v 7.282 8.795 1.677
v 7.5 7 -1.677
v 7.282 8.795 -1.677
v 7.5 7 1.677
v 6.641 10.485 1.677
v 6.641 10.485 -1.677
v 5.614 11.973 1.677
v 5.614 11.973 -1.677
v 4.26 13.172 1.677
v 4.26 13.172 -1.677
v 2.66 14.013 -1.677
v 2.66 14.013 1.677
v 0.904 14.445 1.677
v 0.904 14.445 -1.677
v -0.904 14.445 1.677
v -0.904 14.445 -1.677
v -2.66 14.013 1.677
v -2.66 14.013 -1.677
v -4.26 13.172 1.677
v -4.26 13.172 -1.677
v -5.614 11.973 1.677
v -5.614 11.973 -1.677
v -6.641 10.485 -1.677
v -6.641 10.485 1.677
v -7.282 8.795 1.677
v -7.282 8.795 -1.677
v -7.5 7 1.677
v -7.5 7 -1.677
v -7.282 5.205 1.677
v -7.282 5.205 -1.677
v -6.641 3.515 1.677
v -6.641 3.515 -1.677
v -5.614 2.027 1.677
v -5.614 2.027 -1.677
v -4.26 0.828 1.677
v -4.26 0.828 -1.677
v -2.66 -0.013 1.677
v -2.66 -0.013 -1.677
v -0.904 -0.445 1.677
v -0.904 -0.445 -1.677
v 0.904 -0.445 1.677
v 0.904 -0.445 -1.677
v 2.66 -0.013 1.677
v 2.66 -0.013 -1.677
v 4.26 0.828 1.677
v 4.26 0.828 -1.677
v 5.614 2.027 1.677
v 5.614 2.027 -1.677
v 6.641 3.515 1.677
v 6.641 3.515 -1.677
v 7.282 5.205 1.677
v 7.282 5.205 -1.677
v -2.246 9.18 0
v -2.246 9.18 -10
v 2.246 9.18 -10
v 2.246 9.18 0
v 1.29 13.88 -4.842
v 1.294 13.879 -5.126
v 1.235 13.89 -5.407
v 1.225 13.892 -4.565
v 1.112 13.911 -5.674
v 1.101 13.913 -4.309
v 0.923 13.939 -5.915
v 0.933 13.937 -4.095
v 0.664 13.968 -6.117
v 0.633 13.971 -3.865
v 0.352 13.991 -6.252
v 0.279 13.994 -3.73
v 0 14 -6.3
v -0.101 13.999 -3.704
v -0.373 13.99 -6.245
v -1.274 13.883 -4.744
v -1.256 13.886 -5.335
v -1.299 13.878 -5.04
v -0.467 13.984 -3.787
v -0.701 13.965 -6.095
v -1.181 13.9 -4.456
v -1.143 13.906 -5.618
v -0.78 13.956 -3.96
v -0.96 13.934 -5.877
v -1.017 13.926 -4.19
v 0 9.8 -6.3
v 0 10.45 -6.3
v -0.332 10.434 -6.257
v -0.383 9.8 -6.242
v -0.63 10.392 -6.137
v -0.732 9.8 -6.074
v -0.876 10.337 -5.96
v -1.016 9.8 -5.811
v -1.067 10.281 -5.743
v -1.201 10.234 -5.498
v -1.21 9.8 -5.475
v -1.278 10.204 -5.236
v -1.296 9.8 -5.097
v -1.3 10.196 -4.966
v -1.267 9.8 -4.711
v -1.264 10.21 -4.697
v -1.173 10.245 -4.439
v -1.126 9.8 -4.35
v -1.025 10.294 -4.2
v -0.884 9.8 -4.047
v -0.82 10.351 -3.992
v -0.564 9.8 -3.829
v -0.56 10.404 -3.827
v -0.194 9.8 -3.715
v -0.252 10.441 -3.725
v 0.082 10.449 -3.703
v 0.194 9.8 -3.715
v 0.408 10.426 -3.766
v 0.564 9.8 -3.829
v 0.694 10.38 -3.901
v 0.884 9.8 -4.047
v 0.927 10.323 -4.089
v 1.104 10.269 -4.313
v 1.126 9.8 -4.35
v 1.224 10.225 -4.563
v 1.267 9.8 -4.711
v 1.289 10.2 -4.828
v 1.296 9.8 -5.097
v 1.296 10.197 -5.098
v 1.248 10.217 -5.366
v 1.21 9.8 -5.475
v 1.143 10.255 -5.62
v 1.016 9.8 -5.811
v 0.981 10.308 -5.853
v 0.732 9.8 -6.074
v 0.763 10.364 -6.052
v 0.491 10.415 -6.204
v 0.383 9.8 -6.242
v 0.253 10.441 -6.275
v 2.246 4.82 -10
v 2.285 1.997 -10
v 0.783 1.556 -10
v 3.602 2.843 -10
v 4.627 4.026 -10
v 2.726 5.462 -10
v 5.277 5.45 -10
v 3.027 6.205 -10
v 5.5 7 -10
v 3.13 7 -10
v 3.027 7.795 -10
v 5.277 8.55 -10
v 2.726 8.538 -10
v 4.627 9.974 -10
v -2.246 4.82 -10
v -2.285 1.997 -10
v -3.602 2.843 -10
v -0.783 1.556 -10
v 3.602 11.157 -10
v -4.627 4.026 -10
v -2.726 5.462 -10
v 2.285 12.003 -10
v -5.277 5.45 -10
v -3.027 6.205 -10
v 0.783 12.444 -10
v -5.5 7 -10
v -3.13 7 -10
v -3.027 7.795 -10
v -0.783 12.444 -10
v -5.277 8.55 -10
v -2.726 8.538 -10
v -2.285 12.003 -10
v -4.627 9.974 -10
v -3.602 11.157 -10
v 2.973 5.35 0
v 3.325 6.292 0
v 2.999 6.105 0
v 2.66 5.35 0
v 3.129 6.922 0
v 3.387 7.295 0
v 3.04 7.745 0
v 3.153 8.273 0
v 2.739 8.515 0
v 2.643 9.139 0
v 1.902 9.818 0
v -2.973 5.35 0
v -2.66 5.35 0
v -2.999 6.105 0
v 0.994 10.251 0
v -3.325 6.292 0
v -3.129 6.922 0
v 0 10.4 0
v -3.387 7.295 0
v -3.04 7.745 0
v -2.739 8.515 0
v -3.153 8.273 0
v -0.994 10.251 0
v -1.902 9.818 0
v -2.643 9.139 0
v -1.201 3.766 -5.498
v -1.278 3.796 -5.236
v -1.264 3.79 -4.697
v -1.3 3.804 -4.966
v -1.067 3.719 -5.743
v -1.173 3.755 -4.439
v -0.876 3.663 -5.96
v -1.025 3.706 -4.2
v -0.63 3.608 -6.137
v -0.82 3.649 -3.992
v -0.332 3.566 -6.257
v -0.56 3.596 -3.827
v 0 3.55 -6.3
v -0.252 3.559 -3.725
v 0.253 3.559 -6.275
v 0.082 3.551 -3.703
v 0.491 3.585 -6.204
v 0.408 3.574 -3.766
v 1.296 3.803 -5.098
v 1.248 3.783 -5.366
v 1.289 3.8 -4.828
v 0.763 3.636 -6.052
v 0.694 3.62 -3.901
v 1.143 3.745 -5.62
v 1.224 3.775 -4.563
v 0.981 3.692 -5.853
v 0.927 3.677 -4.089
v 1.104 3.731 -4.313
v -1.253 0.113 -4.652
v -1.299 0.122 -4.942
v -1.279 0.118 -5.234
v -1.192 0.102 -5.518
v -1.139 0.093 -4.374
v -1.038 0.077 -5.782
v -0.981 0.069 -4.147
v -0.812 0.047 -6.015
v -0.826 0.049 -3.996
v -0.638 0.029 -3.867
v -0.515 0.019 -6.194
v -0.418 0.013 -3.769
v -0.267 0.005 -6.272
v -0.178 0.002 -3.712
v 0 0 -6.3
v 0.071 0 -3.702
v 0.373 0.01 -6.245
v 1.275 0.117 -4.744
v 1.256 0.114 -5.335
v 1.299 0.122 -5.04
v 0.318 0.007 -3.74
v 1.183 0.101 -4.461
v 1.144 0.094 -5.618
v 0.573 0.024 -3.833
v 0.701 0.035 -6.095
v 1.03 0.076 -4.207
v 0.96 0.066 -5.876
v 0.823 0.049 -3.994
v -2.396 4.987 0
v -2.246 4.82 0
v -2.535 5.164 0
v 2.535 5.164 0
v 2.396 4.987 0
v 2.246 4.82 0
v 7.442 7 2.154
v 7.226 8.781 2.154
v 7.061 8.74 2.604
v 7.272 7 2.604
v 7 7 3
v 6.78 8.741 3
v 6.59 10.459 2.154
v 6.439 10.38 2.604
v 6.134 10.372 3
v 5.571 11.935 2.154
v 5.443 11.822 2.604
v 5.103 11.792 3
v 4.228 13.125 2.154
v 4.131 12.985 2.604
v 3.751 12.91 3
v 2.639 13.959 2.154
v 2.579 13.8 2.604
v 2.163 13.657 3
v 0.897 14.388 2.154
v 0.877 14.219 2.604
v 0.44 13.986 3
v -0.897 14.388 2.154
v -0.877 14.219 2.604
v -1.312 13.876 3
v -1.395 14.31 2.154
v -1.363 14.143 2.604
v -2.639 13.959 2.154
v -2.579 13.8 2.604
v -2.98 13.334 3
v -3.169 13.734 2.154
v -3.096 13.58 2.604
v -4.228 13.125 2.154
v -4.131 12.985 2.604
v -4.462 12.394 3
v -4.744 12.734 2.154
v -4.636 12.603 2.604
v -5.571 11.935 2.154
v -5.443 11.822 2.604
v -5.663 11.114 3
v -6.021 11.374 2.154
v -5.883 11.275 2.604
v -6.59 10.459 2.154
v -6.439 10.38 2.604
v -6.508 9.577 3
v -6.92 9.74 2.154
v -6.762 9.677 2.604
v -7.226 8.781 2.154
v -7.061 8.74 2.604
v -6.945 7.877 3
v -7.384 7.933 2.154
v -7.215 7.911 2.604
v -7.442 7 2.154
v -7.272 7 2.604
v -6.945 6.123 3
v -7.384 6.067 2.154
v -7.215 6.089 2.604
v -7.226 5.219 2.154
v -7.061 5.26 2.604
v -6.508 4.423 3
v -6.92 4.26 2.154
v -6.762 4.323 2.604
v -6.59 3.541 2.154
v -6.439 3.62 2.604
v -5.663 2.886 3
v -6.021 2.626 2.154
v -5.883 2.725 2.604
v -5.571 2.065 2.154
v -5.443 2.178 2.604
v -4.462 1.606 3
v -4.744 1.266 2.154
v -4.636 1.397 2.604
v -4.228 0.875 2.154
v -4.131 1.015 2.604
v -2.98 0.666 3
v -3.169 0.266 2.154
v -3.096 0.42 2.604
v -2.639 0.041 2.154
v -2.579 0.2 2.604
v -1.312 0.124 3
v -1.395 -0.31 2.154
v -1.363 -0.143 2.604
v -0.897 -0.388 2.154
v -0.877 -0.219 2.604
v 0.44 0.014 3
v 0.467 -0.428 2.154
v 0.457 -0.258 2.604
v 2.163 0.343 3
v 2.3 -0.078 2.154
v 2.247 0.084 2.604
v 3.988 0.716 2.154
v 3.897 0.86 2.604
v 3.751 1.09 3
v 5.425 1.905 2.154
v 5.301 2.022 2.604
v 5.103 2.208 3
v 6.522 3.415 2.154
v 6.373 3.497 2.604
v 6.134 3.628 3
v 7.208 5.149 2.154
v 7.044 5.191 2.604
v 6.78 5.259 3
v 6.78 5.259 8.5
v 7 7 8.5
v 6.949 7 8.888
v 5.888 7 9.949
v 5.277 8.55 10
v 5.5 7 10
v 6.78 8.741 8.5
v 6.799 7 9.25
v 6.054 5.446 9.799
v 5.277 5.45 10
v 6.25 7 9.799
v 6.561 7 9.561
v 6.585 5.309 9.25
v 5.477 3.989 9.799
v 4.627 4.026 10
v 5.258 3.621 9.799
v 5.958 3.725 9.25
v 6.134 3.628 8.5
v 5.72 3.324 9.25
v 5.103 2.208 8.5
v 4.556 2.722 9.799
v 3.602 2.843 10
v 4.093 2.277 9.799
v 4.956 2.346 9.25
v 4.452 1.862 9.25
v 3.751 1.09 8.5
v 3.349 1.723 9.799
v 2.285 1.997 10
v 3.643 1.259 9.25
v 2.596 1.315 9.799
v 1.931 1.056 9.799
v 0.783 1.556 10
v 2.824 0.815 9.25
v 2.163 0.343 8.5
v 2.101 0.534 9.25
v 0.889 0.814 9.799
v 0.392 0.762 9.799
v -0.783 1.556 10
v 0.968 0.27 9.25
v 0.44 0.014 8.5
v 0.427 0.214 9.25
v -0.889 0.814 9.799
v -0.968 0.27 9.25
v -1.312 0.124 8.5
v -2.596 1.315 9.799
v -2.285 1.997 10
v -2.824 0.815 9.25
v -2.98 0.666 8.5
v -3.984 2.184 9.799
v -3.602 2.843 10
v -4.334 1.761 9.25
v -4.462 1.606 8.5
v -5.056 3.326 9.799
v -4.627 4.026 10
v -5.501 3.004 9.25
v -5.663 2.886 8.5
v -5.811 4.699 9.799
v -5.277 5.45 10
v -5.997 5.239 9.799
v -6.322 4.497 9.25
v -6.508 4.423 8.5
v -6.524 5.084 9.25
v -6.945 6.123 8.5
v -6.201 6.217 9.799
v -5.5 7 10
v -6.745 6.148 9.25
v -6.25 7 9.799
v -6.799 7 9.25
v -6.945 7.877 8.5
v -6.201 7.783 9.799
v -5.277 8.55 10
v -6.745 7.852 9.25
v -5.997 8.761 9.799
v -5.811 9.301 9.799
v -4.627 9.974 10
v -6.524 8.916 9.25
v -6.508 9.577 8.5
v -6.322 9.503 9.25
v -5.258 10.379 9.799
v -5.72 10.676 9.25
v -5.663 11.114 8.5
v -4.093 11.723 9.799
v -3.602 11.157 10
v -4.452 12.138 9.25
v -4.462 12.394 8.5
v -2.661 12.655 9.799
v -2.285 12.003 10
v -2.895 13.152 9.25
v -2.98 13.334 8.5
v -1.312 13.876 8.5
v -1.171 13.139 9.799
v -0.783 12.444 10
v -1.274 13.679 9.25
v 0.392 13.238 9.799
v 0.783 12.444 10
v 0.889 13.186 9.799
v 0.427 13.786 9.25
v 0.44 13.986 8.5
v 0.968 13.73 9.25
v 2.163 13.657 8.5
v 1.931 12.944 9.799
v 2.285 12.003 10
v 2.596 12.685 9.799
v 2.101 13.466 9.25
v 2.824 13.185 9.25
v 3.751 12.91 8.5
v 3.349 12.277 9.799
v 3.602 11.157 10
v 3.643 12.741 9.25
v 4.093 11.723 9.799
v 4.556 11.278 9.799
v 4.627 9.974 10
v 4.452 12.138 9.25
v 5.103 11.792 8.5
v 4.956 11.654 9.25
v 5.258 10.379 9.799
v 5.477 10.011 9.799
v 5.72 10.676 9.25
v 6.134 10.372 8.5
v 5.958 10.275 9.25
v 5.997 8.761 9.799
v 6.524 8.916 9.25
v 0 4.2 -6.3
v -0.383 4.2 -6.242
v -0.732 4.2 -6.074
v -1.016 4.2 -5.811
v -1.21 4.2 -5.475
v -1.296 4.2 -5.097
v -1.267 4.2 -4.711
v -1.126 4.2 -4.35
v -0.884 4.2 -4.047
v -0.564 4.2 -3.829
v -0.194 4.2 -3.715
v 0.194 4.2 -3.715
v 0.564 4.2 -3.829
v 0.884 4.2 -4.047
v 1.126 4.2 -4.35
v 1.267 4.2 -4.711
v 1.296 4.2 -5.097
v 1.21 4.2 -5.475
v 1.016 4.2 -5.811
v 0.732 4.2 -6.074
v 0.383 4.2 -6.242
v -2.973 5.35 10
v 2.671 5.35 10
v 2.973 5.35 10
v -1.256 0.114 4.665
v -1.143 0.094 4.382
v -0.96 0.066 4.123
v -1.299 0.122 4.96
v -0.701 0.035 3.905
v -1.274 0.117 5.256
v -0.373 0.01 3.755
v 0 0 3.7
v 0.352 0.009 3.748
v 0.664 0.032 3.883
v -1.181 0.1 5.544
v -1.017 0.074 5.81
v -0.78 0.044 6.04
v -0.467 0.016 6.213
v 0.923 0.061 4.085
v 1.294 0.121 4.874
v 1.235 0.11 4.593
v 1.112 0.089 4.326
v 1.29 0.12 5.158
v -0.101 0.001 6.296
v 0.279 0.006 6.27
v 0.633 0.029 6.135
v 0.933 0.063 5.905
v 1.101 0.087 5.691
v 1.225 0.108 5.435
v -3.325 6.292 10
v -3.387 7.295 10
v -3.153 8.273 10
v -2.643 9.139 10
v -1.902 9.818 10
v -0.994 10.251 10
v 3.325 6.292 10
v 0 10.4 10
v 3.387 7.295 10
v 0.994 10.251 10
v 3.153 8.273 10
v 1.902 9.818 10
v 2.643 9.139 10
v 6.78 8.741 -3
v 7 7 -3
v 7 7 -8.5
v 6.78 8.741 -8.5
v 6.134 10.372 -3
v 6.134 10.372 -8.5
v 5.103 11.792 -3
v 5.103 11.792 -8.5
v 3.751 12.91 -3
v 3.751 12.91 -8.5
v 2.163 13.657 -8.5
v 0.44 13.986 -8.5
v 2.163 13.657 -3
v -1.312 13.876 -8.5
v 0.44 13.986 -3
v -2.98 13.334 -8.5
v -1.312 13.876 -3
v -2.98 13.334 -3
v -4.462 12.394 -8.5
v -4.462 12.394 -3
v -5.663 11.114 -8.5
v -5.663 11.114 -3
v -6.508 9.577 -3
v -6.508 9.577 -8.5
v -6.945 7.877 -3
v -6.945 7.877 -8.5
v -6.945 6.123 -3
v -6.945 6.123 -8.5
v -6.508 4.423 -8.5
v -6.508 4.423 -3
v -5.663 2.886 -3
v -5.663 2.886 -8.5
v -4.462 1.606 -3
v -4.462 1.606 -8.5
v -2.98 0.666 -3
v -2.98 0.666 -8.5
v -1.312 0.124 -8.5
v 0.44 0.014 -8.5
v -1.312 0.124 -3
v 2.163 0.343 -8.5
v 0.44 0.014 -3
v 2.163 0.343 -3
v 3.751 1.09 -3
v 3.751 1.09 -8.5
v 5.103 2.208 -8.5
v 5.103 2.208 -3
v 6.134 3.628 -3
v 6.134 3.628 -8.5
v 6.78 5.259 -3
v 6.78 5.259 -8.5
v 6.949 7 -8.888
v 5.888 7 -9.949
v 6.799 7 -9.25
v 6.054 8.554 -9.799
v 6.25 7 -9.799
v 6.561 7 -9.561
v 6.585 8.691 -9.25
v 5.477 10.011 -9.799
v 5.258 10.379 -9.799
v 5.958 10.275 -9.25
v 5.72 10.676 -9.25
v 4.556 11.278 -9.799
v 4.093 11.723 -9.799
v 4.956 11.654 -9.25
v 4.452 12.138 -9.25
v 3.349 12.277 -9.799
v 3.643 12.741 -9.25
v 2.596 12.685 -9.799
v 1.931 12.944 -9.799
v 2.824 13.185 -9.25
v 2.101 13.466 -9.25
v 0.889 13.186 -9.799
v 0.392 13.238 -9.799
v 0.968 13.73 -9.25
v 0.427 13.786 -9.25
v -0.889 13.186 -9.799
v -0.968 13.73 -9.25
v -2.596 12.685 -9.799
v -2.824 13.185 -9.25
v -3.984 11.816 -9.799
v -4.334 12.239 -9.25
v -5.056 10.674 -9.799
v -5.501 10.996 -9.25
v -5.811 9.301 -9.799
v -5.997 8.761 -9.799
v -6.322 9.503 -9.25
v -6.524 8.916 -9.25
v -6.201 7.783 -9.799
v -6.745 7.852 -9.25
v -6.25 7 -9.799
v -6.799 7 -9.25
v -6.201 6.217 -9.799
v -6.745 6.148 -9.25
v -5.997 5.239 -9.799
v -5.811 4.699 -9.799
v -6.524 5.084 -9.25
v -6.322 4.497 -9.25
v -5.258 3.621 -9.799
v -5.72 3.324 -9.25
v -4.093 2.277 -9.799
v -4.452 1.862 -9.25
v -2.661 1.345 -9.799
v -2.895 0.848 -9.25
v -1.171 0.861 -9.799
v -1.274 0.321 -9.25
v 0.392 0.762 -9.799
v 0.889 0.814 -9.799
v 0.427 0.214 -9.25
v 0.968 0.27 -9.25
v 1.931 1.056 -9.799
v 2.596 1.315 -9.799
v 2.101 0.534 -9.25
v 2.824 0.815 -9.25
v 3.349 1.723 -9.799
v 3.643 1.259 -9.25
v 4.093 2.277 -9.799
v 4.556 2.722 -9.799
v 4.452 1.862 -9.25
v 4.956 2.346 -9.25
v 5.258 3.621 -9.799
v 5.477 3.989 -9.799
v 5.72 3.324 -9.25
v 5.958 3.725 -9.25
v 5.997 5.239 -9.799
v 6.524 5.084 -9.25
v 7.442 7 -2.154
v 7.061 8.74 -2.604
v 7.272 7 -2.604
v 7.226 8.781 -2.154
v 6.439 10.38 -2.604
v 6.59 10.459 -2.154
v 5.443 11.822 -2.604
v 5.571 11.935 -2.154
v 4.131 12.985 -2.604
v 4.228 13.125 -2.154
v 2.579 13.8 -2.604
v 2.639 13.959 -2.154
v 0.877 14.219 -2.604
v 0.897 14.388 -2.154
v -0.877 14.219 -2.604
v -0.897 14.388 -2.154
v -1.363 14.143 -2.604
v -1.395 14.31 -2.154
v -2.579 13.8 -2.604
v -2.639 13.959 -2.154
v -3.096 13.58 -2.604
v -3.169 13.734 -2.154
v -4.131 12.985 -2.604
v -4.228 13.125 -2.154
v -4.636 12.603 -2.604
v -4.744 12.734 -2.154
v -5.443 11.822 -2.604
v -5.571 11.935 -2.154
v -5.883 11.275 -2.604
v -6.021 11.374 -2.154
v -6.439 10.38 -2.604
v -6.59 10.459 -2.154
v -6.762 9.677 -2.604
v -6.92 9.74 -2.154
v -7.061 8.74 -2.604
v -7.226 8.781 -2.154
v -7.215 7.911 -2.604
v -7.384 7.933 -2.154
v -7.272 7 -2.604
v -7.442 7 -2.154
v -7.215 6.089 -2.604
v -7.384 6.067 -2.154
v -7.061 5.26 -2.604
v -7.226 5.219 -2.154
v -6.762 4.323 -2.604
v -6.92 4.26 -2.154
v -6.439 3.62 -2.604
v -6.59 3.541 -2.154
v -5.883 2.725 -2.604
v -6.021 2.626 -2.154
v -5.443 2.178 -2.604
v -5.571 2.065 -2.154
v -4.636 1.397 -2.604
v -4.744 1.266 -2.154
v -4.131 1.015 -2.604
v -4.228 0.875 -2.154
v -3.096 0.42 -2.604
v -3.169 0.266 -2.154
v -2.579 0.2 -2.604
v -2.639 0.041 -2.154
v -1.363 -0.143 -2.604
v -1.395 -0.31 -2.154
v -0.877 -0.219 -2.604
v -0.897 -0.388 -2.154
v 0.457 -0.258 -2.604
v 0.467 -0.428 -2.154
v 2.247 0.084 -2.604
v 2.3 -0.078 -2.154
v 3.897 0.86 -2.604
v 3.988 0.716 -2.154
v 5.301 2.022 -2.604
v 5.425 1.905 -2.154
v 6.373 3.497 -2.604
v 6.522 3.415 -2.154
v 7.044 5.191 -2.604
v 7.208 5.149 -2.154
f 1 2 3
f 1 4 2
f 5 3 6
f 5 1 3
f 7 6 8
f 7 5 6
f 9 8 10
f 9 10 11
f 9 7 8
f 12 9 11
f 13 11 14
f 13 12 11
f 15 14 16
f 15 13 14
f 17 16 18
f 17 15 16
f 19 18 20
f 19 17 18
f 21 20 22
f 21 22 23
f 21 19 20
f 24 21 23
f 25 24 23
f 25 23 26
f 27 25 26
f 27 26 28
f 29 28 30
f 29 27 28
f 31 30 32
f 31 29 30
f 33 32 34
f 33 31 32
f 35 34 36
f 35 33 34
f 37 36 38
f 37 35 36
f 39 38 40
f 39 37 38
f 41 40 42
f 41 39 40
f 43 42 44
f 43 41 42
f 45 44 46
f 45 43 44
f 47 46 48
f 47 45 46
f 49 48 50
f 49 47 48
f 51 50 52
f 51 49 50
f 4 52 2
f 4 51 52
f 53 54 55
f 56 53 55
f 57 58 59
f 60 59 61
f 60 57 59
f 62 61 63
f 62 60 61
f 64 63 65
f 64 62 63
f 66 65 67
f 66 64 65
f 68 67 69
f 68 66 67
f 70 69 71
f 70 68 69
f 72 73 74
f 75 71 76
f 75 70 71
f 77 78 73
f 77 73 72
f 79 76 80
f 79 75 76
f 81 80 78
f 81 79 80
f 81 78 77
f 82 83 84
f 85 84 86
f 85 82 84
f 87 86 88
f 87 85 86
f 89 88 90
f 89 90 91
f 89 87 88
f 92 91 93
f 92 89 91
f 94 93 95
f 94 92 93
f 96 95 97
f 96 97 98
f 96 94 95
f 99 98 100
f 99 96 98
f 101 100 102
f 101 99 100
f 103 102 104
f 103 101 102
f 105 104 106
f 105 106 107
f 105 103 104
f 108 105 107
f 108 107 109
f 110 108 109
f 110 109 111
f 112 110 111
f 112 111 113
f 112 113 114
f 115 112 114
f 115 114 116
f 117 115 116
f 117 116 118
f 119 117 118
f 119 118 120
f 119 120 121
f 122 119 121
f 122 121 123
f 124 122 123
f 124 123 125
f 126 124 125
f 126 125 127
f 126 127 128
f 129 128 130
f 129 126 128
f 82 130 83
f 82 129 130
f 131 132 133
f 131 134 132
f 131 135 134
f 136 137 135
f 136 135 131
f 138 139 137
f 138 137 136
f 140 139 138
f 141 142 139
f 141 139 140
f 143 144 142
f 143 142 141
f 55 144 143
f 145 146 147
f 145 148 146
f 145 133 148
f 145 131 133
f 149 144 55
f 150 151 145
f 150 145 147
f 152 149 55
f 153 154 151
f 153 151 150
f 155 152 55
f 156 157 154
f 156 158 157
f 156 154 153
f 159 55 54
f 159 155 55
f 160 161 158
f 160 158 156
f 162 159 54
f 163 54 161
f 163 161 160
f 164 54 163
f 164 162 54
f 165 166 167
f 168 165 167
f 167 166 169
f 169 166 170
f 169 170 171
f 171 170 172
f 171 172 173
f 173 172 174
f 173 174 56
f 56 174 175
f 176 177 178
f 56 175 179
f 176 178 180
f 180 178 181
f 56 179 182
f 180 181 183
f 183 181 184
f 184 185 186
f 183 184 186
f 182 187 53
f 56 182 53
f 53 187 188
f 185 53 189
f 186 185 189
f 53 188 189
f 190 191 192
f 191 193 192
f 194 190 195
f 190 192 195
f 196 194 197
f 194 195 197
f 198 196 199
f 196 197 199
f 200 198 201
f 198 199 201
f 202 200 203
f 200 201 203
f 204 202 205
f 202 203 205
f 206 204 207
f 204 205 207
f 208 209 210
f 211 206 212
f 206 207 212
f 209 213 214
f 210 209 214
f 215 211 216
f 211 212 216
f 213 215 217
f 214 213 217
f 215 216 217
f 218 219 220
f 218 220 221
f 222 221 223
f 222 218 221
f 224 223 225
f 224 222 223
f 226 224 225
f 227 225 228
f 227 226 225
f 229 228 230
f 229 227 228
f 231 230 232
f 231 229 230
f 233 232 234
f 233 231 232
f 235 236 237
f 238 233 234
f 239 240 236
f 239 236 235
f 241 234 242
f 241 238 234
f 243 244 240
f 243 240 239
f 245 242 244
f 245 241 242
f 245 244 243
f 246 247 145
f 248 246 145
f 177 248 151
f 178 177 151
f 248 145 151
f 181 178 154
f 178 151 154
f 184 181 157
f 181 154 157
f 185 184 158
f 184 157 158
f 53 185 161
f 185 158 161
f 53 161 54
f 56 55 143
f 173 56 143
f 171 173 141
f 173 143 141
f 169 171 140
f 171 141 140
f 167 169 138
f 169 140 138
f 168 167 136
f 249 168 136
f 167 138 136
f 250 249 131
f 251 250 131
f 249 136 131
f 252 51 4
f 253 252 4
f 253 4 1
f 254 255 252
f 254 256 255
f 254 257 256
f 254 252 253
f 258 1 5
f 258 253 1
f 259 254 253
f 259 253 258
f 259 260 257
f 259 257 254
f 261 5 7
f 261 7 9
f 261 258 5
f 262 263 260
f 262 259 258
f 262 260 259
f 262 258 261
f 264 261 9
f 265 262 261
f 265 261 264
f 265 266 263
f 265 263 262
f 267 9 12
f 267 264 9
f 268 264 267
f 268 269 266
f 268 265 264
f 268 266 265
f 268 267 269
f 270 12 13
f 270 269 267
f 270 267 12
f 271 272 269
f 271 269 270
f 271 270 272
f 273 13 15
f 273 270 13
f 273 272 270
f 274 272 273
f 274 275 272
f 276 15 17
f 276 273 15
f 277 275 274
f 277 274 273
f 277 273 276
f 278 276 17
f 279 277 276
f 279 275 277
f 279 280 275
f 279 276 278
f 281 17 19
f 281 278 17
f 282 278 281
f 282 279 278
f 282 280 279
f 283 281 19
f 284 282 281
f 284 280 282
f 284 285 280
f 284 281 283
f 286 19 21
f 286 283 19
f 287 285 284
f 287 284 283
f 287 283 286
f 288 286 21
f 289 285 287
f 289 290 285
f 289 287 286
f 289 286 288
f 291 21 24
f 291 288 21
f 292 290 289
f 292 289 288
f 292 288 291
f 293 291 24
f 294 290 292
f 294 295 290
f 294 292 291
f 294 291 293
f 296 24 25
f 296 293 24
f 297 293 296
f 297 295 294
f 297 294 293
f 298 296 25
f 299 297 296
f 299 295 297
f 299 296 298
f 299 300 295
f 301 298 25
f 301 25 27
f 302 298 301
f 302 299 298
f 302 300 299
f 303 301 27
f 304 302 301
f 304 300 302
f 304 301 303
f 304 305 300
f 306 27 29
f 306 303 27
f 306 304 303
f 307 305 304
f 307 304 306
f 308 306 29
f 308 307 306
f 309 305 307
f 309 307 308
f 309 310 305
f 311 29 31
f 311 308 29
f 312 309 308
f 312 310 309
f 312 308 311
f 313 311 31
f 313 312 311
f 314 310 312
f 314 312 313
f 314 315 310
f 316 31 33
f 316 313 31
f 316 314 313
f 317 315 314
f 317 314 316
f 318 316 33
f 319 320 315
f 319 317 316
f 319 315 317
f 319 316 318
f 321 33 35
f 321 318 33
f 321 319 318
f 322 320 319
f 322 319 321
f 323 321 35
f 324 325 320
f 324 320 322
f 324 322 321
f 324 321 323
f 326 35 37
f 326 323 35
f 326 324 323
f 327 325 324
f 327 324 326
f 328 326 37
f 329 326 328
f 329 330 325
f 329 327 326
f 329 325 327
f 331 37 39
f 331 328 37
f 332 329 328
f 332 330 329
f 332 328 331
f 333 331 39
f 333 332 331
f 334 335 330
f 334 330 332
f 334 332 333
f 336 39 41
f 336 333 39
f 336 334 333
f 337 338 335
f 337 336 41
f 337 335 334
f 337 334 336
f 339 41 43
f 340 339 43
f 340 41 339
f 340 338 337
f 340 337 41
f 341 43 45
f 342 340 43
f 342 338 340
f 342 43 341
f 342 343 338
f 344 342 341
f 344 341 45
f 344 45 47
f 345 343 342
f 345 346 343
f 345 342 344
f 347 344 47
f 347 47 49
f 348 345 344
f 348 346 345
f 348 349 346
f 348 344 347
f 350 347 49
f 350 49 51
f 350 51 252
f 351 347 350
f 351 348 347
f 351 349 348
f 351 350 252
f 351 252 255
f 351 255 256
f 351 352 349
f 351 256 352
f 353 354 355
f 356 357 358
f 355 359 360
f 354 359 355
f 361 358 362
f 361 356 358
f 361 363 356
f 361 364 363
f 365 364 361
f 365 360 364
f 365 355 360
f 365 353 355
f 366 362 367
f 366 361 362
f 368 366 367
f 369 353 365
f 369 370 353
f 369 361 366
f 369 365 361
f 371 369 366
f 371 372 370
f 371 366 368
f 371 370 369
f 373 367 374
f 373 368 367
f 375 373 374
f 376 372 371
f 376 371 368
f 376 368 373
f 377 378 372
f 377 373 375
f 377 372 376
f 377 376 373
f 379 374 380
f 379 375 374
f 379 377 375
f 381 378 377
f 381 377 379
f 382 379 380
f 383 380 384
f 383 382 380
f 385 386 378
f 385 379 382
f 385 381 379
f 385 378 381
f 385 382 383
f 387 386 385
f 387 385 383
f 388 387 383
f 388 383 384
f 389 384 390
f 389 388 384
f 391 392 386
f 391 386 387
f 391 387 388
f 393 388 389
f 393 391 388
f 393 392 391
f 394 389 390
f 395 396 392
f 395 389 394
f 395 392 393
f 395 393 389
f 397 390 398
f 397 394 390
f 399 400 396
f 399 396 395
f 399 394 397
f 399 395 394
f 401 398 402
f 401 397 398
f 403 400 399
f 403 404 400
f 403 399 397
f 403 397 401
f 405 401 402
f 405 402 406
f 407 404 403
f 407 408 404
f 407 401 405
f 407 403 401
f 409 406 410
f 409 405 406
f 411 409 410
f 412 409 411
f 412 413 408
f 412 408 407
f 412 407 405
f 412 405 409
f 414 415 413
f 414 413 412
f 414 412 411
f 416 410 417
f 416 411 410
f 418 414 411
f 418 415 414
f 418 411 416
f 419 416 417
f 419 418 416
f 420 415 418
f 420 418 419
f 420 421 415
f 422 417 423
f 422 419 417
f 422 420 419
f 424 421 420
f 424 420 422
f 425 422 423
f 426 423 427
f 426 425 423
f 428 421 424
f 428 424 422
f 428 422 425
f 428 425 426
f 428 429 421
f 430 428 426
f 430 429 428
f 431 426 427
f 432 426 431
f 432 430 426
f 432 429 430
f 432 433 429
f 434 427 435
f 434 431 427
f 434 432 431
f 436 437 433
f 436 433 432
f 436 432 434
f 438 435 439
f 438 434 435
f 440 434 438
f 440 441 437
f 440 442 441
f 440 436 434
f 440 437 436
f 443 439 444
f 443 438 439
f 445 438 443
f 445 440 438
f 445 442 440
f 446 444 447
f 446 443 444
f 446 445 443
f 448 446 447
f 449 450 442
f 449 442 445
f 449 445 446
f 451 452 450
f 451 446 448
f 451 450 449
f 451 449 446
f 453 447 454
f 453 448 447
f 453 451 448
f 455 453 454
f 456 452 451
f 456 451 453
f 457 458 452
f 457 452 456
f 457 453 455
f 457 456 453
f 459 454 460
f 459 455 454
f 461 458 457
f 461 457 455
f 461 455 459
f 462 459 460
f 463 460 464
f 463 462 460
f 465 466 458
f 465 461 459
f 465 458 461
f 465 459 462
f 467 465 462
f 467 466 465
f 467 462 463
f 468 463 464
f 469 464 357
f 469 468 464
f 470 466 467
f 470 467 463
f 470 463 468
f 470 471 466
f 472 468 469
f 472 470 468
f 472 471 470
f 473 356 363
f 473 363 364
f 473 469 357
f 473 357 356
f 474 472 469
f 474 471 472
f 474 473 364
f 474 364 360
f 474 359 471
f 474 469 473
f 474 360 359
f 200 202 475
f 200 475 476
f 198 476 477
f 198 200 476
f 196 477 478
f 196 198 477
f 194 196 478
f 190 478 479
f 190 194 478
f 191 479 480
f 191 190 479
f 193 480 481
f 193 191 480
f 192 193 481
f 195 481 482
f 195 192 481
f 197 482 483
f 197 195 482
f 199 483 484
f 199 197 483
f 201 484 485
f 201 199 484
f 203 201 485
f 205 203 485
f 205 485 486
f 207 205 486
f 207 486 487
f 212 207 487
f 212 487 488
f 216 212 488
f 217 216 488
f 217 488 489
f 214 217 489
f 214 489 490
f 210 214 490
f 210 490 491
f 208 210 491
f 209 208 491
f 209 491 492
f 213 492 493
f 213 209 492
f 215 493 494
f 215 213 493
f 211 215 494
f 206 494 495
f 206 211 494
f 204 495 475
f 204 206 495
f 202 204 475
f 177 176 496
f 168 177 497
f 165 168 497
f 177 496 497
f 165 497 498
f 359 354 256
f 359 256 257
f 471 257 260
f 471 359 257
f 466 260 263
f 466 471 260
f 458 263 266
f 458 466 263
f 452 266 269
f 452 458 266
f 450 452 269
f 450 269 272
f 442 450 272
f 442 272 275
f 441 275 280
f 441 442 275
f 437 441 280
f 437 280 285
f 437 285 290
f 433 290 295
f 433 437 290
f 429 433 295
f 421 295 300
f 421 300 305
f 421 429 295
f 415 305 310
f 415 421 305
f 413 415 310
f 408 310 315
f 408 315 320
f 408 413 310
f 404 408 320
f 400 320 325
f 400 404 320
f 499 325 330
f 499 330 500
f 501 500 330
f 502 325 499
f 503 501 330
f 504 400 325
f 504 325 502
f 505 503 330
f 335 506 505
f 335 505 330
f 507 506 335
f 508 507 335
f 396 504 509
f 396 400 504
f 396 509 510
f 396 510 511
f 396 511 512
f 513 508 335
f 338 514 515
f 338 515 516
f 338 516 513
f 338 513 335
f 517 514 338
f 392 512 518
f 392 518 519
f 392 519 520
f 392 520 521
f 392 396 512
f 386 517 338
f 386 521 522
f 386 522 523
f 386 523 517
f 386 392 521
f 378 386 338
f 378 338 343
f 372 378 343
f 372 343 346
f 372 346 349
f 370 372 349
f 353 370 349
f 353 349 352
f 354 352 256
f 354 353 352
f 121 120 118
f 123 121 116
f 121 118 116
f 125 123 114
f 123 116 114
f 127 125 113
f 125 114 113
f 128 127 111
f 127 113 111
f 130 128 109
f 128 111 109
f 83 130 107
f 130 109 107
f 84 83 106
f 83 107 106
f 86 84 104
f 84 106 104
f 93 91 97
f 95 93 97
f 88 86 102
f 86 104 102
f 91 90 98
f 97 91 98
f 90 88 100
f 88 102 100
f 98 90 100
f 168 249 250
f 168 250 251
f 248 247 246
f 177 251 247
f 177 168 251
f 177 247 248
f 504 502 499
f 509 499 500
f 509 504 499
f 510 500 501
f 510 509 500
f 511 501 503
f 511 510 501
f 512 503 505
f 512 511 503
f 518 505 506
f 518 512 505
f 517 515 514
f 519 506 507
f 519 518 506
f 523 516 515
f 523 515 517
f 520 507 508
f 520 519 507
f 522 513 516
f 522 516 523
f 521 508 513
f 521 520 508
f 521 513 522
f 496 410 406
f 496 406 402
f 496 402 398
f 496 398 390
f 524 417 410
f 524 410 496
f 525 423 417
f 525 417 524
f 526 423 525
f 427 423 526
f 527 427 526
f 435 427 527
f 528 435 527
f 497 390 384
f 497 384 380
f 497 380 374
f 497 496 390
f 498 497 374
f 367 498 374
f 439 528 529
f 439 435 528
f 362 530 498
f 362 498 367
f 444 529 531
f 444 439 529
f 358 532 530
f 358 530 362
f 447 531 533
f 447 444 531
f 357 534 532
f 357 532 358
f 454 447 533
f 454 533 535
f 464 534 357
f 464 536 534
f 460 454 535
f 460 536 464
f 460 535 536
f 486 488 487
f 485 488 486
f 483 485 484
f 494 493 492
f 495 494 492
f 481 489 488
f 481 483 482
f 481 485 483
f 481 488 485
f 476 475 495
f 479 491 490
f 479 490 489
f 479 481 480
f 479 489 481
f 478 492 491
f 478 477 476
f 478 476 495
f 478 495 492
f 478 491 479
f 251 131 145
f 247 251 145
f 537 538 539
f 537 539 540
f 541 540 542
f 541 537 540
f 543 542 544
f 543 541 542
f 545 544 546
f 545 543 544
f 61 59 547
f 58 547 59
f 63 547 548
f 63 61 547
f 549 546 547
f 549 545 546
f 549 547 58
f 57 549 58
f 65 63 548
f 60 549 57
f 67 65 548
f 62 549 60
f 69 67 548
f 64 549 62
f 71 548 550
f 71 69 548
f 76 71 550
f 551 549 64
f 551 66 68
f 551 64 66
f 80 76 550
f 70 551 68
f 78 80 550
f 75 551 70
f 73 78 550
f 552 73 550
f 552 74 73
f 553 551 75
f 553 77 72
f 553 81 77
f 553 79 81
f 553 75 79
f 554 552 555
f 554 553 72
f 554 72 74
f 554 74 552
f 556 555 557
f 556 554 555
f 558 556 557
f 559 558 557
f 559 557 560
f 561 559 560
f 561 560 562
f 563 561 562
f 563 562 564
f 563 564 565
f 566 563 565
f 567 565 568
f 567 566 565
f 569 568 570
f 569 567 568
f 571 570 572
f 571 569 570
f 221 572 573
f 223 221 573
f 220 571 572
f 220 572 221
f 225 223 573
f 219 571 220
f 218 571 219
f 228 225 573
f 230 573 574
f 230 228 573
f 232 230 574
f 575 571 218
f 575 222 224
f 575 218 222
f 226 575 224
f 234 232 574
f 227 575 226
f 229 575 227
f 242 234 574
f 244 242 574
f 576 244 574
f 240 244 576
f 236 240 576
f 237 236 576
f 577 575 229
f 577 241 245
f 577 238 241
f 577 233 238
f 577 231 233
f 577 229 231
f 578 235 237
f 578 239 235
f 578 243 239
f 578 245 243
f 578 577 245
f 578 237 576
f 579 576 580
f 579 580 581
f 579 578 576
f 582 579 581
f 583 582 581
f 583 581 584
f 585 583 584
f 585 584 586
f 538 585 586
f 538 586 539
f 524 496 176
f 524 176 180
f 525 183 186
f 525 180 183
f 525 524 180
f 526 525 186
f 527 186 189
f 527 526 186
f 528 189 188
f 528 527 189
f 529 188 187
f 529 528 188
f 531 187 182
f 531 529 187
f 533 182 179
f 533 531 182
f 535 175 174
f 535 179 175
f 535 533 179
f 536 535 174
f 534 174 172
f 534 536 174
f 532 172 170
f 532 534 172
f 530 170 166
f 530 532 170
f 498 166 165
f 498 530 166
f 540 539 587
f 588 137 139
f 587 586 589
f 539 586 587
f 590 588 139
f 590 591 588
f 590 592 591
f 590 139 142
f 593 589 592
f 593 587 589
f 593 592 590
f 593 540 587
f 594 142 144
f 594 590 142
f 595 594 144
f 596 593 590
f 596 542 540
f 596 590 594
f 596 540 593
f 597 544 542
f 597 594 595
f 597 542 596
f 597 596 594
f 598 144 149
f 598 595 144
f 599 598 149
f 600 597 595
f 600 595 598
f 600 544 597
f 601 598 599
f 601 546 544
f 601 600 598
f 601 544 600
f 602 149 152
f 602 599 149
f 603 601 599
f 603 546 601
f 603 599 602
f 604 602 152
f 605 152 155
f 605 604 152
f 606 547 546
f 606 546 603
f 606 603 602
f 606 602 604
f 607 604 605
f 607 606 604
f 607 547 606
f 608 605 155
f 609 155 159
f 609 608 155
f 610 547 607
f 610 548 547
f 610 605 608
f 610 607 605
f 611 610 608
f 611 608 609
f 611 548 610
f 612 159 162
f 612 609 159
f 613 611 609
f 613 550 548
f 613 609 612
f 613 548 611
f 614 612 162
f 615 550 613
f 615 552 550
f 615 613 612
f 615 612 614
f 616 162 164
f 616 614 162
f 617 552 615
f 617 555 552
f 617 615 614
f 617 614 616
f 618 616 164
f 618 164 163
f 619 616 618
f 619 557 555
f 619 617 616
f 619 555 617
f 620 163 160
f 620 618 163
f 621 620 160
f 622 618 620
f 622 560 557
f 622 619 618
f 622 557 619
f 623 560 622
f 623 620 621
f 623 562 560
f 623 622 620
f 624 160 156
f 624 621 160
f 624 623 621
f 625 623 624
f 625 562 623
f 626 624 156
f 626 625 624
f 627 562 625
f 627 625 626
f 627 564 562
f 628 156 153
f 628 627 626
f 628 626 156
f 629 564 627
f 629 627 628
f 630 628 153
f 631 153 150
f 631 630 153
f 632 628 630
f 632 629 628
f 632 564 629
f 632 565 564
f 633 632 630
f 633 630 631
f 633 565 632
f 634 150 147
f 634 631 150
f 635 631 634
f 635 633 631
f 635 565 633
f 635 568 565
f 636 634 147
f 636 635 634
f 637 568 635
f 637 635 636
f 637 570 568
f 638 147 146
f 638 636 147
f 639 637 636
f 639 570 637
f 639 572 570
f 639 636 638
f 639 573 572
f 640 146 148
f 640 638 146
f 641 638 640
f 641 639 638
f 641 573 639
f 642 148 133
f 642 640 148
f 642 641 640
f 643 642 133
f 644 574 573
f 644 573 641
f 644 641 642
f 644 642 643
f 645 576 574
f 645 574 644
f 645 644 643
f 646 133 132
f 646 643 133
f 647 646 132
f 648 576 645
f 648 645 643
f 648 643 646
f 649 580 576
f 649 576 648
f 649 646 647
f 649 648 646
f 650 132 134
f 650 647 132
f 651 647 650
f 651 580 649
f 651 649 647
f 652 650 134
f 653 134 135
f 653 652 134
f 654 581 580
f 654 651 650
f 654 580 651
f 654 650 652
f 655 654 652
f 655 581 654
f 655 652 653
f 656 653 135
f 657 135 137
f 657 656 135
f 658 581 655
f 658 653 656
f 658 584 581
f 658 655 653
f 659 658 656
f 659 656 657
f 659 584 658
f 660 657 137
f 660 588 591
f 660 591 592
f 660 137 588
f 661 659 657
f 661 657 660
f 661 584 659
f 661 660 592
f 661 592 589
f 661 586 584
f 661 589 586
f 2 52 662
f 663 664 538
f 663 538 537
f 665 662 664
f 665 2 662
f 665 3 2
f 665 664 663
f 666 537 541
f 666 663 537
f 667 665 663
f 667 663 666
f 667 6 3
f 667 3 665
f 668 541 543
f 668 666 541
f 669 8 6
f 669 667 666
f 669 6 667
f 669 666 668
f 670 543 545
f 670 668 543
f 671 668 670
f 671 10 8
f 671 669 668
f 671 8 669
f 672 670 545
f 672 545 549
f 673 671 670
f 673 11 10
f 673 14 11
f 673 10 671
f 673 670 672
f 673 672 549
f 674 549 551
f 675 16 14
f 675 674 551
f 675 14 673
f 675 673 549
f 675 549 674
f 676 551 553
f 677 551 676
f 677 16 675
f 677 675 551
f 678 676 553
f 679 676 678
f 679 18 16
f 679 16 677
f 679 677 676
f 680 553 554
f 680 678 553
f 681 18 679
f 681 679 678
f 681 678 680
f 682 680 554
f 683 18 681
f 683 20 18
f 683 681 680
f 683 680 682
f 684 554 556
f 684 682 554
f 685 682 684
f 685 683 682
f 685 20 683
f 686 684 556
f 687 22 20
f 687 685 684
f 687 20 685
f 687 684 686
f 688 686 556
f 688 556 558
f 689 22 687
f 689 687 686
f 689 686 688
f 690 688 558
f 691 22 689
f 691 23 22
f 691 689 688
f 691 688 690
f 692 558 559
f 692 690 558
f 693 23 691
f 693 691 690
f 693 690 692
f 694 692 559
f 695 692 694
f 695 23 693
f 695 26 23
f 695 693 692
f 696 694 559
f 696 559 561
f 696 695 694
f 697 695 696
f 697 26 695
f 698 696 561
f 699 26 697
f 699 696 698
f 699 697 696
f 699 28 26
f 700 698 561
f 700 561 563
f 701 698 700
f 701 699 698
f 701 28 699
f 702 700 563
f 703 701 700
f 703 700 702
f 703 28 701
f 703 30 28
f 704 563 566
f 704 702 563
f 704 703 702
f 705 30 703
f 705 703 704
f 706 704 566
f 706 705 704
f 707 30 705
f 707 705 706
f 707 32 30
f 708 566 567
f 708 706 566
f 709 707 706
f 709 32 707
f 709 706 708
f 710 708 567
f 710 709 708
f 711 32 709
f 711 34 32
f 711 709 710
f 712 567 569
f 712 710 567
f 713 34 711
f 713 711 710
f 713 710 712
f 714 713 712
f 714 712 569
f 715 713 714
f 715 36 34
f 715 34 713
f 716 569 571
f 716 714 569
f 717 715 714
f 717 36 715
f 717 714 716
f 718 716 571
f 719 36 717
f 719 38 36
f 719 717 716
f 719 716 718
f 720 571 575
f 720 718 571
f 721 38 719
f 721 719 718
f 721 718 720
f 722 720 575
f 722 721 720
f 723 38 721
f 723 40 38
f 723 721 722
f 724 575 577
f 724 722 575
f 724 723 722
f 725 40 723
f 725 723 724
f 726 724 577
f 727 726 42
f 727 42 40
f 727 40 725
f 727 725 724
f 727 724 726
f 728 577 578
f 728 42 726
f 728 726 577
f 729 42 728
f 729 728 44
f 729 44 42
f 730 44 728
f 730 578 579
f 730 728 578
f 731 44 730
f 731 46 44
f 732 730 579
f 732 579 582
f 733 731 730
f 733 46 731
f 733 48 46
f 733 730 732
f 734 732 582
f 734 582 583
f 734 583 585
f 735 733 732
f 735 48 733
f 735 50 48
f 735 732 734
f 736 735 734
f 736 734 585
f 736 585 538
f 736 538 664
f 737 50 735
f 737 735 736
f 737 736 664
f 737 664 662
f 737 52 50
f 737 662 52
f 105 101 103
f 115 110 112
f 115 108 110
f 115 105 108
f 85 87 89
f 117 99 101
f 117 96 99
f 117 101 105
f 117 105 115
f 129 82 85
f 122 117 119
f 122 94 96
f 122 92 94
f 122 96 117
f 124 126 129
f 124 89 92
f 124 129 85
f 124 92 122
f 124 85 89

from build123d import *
from build123d.topology import SkipClean

# Parameters (mm, degrees)
ESBO_O1_W                  = 14
ESBO_O1_H                  = 20
ESBO_O1_R                  = 1.25
RESSALTO_EXTRUS_O1_DEPTH   = 14
ESBO_O6_R                  = 2.75
CORTE_EXTRUS_O3_DEPTH      = 10
CORTE_EXTRUS_O5_DEPTH      = 10
CORTE_EXTRUS_O5_DEPTH_BACK = 10
ESBO_O3_R                  = 1.25
ESBO_O8_R                  = 3.05
CORTE_EXTRUS_O6_DEPTH      = 10
ESBO_O9_OUTSIDE_W          = 21.628
ESBO_O9_OUTSIDE_H          = 21.628
ESBO_O9_OUTSIDE_R          = 7
CORTE_EXTRUS_O7_DEPTH      = 26.396850332
RESSALTO_EXTRUS_O2_START   = -6.122497316
RESSALTO_EXTRUS_O2_DEPTH   = 2.244994532
RESSALTO_EXTRUS_O3_DEPTH   = 10
ESBO_O13_R                 = 1.3
CORTE_EXTRUS_O8_DEPTH      = 16
RESSALTO_EXTRUS_O4_DEPTH   = 10
ESBO_O15_R                 = 1.3
CORTE_EXTRUS_O9_DEPTH      = 7
ESBO_O16_R                 = 7.5
ESBO_O16_R_2               = 7
RESSALTO_EXTRUS_O5_DEPTH   = 3
FILETE2_R                  = 2
FILETE3_R                  = 2
RESSALTO_EXTRUS_O6_START   = 10
RESSALTO_EXTRUS_O6_DEPTH   = 10
CORTE_EXTRUS_O11_DEPTH     = 10
CORTE_EXTRUS_O12_DEPTH     = 10
RESSALTO_EXTRUS_O8_DEPTH   = 10
RESSALTO_EXTRUS_O9_DEPTH   = 10
RESSALTO_EXTRUS_O10_DEPTH  = 10
ESBO_O26_R                 = 7
ESBO_O26_R_2               = 3.45
RESSALTO_EXTRUS_O11_DEPTH  = 20
FILETE4_R                  = 1.5
FILETE5_R                  = 1.5
ESBO_O27_W                 = 5.34202784
ESBO_O27_H                 = 3.157877353
RESSALTO_EXTRUS_O12_DEPTH  = 8


# Read off the part's stored shape, not the designer's step: Ressalto-extrusão2
with BuildPart() as part:
    # Esboço1 → Ressalto-extrusão1 (new body)
    with BuildSketch(Plane(origin=(0, 0, 0), x_dir=(1, 0, 0), z_dir=(0, 1, 0))):
        Rectangle(ESBO_O1_W, ESBO_O1_H)
        with Locations(Location((0, 5, 0), (0, 0, 270))):
            Circle(ESBO_O1_R, mode=Mode.SUBTRACT)
    extrude(amount=RESSALTO_EXTRUS_O1_DEPTH)

    # Esboço6 → Corte-extrusão3 (cut)
    with BuildSketch(Plane(origin=(0, 0, -10), x_dir=(-1, 0, 0), z_dir=(0, 0, -1))):
        with Locations((0, 7)):
            Circle(ESBO_O6_R)
    extrude(amount=-CORTE_EXTRUS_O3_DEPTH, mode=Mode.SUBTRACT)

    # Esboço3 → Corte-extrusão5 (cut, two sides: drawn at the far end of the back side and taken through both)
    with BuildSketch(Plane(origin=(0, 0, 0), x_dir=(1, 0, 0), z_dir=(0, 1, 0)).offset(-CORTE_EXTRUS_O5_DEPTH_BACK)):
        with Locations(Location((0, -5, 0), (0, 0, 270))):
            Circle(ESBO_O3_R)
    extrude(amount=CORTE_EXTRUS_O5_DEPTH + CORTE_EXTRUS_O5_DEPTH_BACK, mode=Mode.SUBTRACT)

    # Esboço8 → Corte-extrusão6 (cut)
    with BuildSketch(Plane.XY.offset(10)):
        with Locations((0, 7)):
            Circle(ESBO_O8_R)
    extrude(amount=-CORTE_EXTRUS_O6_DEPTH, mode=Mode.SUBTRACT)

    # Esboço9 outside → Corte-extrusão7 (cut, through all)
    with BuildSketch(Plane.XY.offset(10)):
        with Locations((0, 7)):
            Rectangle(ESBO_O9_OUTSIDE_W, ESBO_O9_OUTSIDE_H)
        with Locations((0, 7)):
            Circle(ESBO_O9_OUTSIDE_R, mode=Mode.SUBTRACT)
    extrude(amount=-CORTE_EXTRUS_O7_DEPTH, mode=Mode.SUBTRACT)

    # Ressalto-extrusão2 outline → Ressalto-extrusão2 (add)
    with SkipClean():  # the faces are left unmerged after this step: merging them gives an invalid solid
        with BuildSketch(Plane.XY.offset(10).offset(RESSALTO_EXTRUS_O2_START)):
            with BuildLine():
                ThreePointArc((0.55, 10), (2.343074903, 8.952562419), (3.05, 7))
                Line((3.05, 7), (7, 7))
                ThreePointArc((7, 7), (0, 14), (-7, 7))
                Line((-7, 7), (-3.05, 7))
                ThreePointArc((-3.05, 7), (-2.343074903, 8.952562419), (-0.55, 10))
                ThreePointArc((-0.55, 10), (0, 10.05), (0.55, 10))
            make_face()
        extrude(amount=RESSALTO_EXTRUS_O2_DEPTH)

    # Esboço11 → Ressalto-extrusão3 (add)
    with SkipClean():  # the faces are left unmerged after this step: merging them gives an invalid solid
        with BuildSketch(Plane(origin=(0, 0, -10), x_dir=(-1, 0, 0), z_dir=(0, 0, -1))):
            with BuildLine():
                Line((2.079062289, 5.2), (-2.079062289, 5.2))
                ThreePointArc((-2.079062289, 5.2), (0, 4.25), (2.079062289, 5.2))
            make_face()
            with BuildLine():
                ThreePointArc((2.079062289, 8.8), (0, 9.75), (-2.079062289, 8.8))
                Line((-2.079062289, 8.8), (2.079062289, 8.8))
            make_face()
        extrude(amount=-RESSALTO_EXTRUS_O3_DEPTH)

    # Esboço13 → Corte-extrusão8 (cut)
    with BuildSketch(Plane(origin=(0, 0, 0), x_dir=(1, 0, 0), z_dir=(0, 1, 0))):
        with Locations(Location((0, 5, 0), (0, 0, 90))):
            Circle(ESBO_O13_R)
    extrude(amount=CORTE_EXTRUS_O8_DEPTH, mode=Mode.SUBTRACT)

    # Esboço14 → Ressalto-extrusão4 (add)
    with BuildSketch(Plane.XY.offset(10)):
        with BuildLine():
            Line((0, 3.95), (0, 4.95))
            Line((0, 4.95), (-2.258317958, 4.95))
            ThreePointArc((-2.258317958, 4.95), (-1.234908904, 4.211183047), (0, 3.95))
        make_face()
        with BuildLine():
            Line((2.258317958, 4.95), (0, 4.95))
            Line((0, 4.95), (0, 3.95))
            ThreePointArc((0, 3.95), (1.234908904, 4.211183047), (2.258317958, 4.95))
        make_face()
    extrude(amount=-RESSALTO_EXTRUS_O4_DEPTH)

    # Esboço15 → Corte-extrusão9 (cut)
    with BuildSketch(Plane(origin=(0, 0, 0), x_dir=(1, 0, 0), z_dir=(0, 1, 0))):
        with Locations(Location((0, -5, 0), (0, 0, 90))):
            Circle(ESBO_O15_R)
    extrude(amount=CORTE_EXTRUS_O9_DEPTH, mode=Mode.SUBTRACT)

    # Esboço16 → Ressalto-extrusão5 (add, symmetric)
    with BuildSketch(Plane.XY):
        with Locations((0, 7)):
            Circle(ESBO_O16_R)
        with Locations((0, 7)):
            Circle(ESBO_O16_R_2, mode=Mode.SUBTRACT)
    extrude(amount=RESSALTO_EXTRUS_O5_DEPTH, both=True)

    # Filete2
    # the kernel refuses this fillet: 2 mm, written as the material it takes off along each edge
    with BuildSketch(Plane(origin=(0, 7, 3), x_dir=(1, 0, 0), z_dir=(0, -1, 0))) as filete2_piece_1:
        with BuildLine():
            CenterArc((5.5, -1.322875656), FILETE2_R, 0, 41.409622109)
            Line((7, 0), (7.03, 0.026457513))
            ThreePointArc((7.03, 0.026457513), (7.25, 0.04), (7.5, 0.04))
            Line((7.5, 0.04), (7.54, 0))
            Line((7.54, 0), (7.54, -1.322875656))
            Line((7.54, -1.322875656), (7.5, -1.322875656))
        make_face()
    revolve(axis=Axis((0, 7, 3), (0, 0, 1)), mode=Mode.SUBTRACT)

    # Filete3
    # the kernel refuses this fillet: 2 mm, written as the material it takes off along each edge
    with BuildSketch(Plane(origin=(0, 7, -3), x_dir=(1, 0, 0), z_dir=(0, -1, 0))) as filete3_piece_1:
        with BuildLine():
            CenterArc((5.5, 1.322875656), FILETE3_R, 318.590377891, 41.409622109)
            Line((7.5, 1.322875656), (7.54, 1.322875656))
            Line((7.54, 1.322875656), (7.54, 0))
            Line((7.54, 0), (7.5, -0.04))
            ThreePointArc((7.5, -0.04), (7.25, -0.04), (7.03, -0.026457513))
            Line((7.03, -0.026457513), (7, 0))
        make_face()
    revolve(axis=Axis((0, 7, -3), (0, 0, 1)), mode=Mode.SUBTRACT)

    # Esboço18 → Ressalto-extrusão6 (add)
    with BuildSketch(Plane.XY.offset(RESSALTO_EXTRUS_O6_START)):
        with BuildLine():
            Line((2.46221445, 5.2), (2.079062289, 5.2))
            Line((2.079062289, 5.2), (-2.079062289, 5.2))
            Line((-2.079062289, 5.2), (-2.46221445, 5.2))
            ThreePointArc((-2.46221445, 5.2), (-2.363573895, 5.072302294), (-2.258317958, 4.95))
            Line((-2.258317958, 4.95), (2.258317958, 4.95))
            ThreePointArc((2.258317958, 4.95), (2.363573895, 5.072302294), (2.46221445, 5.2))
        make_face()
    extrude(amount=-RESSALTO_EXTRUS_O6_DEPTH)

    # Esboço19 → Corte-extrusão11 (cut)
    with BuildSketch(Plane.XY.offset(10)):
        with BuildLine():
            ThreePointArc((-2.46221445, 5.2), (0, 10.05), (2.46221445, 5.2))
            Line((2.46221445, 5.2), (3.059820256, 5.2))
            ThreePointArc((3.059820256, 5.2), (0, 10.55), (-3.059820256, 5.2))
            Line((-3.059820256, 5.2), (-2.46221445, 5.2))
        make_face()
    extrude(amount=-CORTE_EXTRUS_O11_DEPTH, mode=Mode.SUBTRACT)

    # Esboço20 → Corte-extrusão12 (cut)
    with BuildSketch(Plane(origin=(0, 0, -10), x_dir=(-1, 0, 0), z_dir=(0, 0, -1))):
        with BuildLine():
            Line((-2.494493937, 4.2), (2.494493937, 4.2))
            ThreePointArc((2.494493937, 4.2), (3.75, 7), (2.494493937, 9.8))
            Line((2.494493937, 9.8), (-2.494493937, 9.8))
            ThreePointArc((-2.494493937, 9.8), (-3.75, 7), (-2.494493937, 4.2))
        make_face()
        with BuildLine():
            Line((-2.079062289, 8.8), (2.079062289, 8.8))
            ThreePointArc((2.079062289, 8.8), (2.75, 7), (2.079062289, 5.2))
            Line((2.079062289, 5.2), (-2.079062289, 5.2))
            ThreePointArc((-2.079062289, 5.2), (-2.75, 7), (-2.079062289, 8.8))
        make_face(mode=Mode.SUBTRACT)
    extrude(amount=-CORTE_EXTRUS_O12_DEPTH, mode=Mode.SUBTRACT)

    # Esboço23 → Ressalto-extrusão8 (add)
    with BuildSketch(Plane(origin=(0, 0, -10), x_dir=(-1, 0, 0), z_dir=(0, 0, -1))):
        with BuildLine():
            Line((-2.494493937, 4.2), (2.494493937, 4.2))
            ThreePointArc((2.494493937, 4.2), (3.75, 7), (2.494493937, 9.8))
            Line((2.494493937, 9.8), (-2.494493937, 9.8))
            ThreePointArc((-2.494493937, 9.8), (-3.75, 7), (-2.494493937, 4.2))
        make_face()
        with BuildLine():
            Line((-2.369493617, 9.48), (2.369493617, 9.48))
            ThreePointArc((2.369493617, 9.48), (3.43, 7), (2.369493617, 4.52))
            Line((2.369493617, 4.52), (-2.369493617, 4.52))
            ThreePointArc((-2.369493617, 4.52), (-3.43, 7), (-2.369493617, 9.48))
        make_face(mode=Mode.SUBTRACT)
    extrude(amount=-RESSALTO_EXTRUS_O8_DEPTH)

    # Esboço24 → Ressalto-extrusão9 (add)
    with BuildSketch(Plane.XY.offset(10)):
        with BuildLine():
            Line((3.059820256, 5.2), (-3.059820256, 5.2))
            ThreePointArc((-3.059820256, 5.2), (0, 10.55), (3.059820256, 5.2))
        make_face()
        with BuildLine():
            Line((2.972793299, 5.35), (-2.972793299, 5.35))
            ThreePointArc((-2.972793299, 5.35), (0, 10.4), (2.972793299, 5.35))
        make_face(mode=Mode.SUBTRACT)
    extrude(amount=-RESSALTO_EXTRUS_O9_DEPTH)

    # Esboço25 → Ressalto-extrusão10 (add)
    with BuildSketch(Plane(origin=(0, 0, -10), x_dir=(-1, 0, 0), z_dir=(0, 0, -1))):
        with BuildLine():
            Line((2.369493617, 9.48), (-2.369493617, 9.48))
            ThreePointArc((-2.369493617, 9.48), (-3.43, 7), (-2.369493617, 4.52))
            Line((-2.369493617, 4.52), (2.369493617, 4.52))
            ThreePointArc((2.369493617, 4.52), (3.43, 7), (2.369493617, 9.48))
        make_face()
        with BuildLine():
            Line((2.245996438, 9.18), (-2.245996438, 9.18))
            ThreePointArc((-2.245996438, 9.18), (-3.13, 7), (-2.245996438, 4.82))
            Line((-2.245996438, 4.82), (2.245996438, 4.82))
            ThreePointArc((2.245996438, 4.82), (3.13, 7), (2.245996438, 9.18))
        make_face(mode=Mode.SUBTRACT)
    extrude(amount=-RESSALTO_EXTRUS_O10_DEPTH)

    # Esboço26 → Ressalto-extrusão11 (add)
    with BuildSketch(Plane.XY.offset(10)):
        with Locations((0, 7)):
            Circle(ESBO_O26_R)
        with Locations((0, 7)):
            Circle(ESBO_O26_R_2, mode=Mode.SUBTRACT)
    extrude(amount=-RESSALTO_EXTRUS_O11_DEPTH)

    # Filete4
    filete4_edges = [part.edges().sort_by_distance(p)[0] for p in [
        (-7, 7, -10),
    ]]
    fillet(filete4_edges, radius=FILETE4_R)

    # Filete5
    filete5_edges = [part.edges().sort_by_distance(p)[0] for p in [
        (-7, 7, 10),
    ]]
    fillet(filete5_edges, radius=FILETE5_R)

    # Esboço27 → Ressalto-extrusão12 (add)
    with BuildSketch(Plane.XY.offset(10)):
        with Locations((0, 3.771061324)):
            Rectangle(ESBO_O27_W, ESBO_O27_H)
    extrude(amount=-RESSALTO_EXTRUS_O12_DEPTH)


solid = part.part
